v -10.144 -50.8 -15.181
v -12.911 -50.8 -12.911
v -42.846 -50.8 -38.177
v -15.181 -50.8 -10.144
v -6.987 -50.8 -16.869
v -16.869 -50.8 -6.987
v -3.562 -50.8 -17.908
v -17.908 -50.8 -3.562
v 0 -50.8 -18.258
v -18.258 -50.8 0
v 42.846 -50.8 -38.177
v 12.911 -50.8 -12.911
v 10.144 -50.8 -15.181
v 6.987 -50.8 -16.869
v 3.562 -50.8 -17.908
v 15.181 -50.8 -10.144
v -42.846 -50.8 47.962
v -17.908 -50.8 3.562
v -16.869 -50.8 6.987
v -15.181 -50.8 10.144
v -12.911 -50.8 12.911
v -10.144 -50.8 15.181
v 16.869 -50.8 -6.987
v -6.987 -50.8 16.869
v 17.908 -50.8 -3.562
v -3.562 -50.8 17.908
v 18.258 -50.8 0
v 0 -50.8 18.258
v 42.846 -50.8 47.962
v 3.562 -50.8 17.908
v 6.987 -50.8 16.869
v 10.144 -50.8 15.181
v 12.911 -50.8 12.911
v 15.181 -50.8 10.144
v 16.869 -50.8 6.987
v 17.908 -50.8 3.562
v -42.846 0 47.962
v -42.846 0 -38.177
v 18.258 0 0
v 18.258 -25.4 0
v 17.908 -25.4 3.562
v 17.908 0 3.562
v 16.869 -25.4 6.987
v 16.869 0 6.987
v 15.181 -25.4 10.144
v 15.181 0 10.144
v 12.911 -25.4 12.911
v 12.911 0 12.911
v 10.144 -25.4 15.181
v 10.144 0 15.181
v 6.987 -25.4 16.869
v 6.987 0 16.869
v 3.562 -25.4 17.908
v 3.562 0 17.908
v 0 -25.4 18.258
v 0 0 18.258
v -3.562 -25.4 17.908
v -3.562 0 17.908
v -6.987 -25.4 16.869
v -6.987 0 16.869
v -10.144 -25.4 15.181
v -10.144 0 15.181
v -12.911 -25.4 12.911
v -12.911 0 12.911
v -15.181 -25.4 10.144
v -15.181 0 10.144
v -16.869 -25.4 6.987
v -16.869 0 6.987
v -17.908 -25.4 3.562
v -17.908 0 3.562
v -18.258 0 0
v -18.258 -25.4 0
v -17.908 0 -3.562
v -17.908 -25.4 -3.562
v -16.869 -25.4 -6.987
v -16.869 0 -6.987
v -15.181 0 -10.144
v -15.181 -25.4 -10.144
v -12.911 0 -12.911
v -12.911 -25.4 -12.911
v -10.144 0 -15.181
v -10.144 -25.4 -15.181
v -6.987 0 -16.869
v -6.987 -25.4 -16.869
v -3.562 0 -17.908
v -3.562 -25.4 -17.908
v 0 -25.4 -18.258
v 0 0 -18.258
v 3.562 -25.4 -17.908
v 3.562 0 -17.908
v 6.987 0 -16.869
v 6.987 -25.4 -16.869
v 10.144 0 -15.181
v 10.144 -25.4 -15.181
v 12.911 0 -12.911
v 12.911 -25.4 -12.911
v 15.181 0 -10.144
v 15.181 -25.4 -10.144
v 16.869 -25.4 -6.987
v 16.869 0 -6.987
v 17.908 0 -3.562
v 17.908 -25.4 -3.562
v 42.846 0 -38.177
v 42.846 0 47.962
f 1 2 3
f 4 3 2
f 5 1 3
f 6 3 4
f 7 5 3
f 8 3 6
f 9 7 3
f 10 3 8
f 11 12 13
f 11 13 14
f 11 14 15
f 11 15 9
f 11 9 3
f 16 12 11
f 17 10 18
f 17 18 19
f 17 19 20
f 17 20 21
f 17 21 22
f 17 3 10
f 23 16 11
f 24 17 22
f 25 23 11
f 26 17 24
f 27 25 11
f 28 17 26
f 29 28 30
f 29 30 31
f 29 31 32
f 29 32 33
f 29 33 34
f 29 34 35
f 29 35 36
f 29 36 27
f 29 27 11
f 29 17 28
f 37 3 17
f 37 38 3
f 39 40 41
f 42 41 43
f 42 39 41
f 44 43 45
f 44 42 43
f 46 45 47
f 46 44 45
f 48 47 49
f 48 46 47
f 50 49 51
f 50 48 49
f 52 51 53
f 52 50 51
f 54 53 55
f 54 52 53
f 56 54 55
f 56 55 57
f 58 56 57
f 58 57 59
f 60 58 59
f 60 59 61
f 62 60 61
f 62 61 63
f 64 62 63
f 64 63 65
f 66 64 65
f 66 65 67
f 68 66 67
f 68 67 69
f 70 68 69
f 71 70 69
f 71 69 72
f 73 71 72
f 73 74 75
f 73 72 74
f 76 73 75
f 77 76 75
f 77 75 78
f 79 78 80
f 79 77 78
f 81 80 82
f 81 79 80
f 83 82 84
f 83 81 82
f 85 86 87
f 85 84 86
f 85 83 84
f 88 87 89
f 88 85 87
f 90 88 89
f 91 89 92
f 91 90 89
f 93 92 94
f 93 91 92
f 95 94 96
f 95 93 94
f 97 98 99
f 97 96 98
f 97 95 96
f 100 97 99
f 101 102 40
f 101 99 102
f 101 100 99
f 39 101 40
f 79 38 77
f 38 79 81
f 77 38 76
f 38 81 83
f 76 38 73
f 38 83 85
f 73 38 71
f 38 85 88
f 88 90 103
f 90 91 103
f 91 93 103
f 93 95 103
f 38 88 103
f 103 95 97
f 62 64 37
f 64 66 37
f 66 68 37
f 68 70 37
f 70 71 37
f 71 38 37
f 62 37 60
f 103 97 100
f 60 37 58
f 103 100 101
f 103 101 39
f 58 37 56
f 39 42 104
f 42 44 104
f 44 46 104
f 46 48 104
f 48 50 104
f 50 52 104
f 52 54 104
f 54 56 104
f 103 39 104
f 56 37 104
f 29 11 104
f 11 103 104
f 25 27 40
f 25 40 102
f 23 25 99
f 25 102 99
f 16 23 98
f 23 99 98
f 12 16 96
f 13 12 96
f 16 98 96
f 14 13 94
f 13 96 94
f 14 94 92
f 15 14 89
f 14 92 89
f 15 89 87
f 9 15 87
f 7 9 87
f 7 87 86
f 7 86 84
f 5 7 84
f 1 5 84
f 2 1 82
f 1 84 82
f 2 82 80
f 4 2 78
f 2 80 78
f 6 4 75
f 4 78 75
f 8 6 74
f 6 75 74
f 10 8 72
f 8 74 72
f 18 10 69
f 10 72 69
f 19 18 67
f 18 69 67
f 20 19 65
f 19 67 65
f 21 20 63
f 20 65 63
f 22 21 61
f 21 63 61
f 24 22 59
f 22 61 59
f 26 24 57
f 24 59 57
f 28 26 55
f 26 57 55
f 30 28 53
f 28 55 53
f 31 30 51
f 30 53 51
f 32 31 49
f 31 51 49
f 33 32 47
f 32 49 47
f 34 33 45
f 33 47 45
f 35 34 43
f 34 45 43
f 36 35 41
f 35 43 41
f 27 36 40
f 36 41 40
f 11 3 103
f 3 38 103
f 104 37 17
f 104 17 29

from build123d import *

# Parameters (mm, degrees)
F0_W     = 85.6928378344
F0_H     = 86.1391574144
F1_DEPTH = 25.4
F2_R     = 18.2584183748
F3_DEPTH = 162.2124761343
F4_DEPTH = 25.4


with BuildPart() as f1:
    # F0 (on Front) → F1 (new body)
    with BuildSketch(Plane.XZ):
        with Locations((-7.4506e-06, 4.8927590251)):
            Rectangle(F0_W, F0_H)
    extrude(amount=F1_DEPTH)

    # F2 (on Front) → F3 (cut)
    with BuildSketch(Plane.XZ):
        Circle(F2_R)
    extrude(amount=F3_DEPTH, mode=Mode.SUBTRACT)

    # F4 (add): a face of the model
    f4_faces = [f1.faces().sort_by_distance(p)[0] for p in [
        (-7.4506e-06, -25.4, 46.747297943),
    ]]
    extrude(f4_faces, amount=F4_DEPTH)


solid = f1.part
